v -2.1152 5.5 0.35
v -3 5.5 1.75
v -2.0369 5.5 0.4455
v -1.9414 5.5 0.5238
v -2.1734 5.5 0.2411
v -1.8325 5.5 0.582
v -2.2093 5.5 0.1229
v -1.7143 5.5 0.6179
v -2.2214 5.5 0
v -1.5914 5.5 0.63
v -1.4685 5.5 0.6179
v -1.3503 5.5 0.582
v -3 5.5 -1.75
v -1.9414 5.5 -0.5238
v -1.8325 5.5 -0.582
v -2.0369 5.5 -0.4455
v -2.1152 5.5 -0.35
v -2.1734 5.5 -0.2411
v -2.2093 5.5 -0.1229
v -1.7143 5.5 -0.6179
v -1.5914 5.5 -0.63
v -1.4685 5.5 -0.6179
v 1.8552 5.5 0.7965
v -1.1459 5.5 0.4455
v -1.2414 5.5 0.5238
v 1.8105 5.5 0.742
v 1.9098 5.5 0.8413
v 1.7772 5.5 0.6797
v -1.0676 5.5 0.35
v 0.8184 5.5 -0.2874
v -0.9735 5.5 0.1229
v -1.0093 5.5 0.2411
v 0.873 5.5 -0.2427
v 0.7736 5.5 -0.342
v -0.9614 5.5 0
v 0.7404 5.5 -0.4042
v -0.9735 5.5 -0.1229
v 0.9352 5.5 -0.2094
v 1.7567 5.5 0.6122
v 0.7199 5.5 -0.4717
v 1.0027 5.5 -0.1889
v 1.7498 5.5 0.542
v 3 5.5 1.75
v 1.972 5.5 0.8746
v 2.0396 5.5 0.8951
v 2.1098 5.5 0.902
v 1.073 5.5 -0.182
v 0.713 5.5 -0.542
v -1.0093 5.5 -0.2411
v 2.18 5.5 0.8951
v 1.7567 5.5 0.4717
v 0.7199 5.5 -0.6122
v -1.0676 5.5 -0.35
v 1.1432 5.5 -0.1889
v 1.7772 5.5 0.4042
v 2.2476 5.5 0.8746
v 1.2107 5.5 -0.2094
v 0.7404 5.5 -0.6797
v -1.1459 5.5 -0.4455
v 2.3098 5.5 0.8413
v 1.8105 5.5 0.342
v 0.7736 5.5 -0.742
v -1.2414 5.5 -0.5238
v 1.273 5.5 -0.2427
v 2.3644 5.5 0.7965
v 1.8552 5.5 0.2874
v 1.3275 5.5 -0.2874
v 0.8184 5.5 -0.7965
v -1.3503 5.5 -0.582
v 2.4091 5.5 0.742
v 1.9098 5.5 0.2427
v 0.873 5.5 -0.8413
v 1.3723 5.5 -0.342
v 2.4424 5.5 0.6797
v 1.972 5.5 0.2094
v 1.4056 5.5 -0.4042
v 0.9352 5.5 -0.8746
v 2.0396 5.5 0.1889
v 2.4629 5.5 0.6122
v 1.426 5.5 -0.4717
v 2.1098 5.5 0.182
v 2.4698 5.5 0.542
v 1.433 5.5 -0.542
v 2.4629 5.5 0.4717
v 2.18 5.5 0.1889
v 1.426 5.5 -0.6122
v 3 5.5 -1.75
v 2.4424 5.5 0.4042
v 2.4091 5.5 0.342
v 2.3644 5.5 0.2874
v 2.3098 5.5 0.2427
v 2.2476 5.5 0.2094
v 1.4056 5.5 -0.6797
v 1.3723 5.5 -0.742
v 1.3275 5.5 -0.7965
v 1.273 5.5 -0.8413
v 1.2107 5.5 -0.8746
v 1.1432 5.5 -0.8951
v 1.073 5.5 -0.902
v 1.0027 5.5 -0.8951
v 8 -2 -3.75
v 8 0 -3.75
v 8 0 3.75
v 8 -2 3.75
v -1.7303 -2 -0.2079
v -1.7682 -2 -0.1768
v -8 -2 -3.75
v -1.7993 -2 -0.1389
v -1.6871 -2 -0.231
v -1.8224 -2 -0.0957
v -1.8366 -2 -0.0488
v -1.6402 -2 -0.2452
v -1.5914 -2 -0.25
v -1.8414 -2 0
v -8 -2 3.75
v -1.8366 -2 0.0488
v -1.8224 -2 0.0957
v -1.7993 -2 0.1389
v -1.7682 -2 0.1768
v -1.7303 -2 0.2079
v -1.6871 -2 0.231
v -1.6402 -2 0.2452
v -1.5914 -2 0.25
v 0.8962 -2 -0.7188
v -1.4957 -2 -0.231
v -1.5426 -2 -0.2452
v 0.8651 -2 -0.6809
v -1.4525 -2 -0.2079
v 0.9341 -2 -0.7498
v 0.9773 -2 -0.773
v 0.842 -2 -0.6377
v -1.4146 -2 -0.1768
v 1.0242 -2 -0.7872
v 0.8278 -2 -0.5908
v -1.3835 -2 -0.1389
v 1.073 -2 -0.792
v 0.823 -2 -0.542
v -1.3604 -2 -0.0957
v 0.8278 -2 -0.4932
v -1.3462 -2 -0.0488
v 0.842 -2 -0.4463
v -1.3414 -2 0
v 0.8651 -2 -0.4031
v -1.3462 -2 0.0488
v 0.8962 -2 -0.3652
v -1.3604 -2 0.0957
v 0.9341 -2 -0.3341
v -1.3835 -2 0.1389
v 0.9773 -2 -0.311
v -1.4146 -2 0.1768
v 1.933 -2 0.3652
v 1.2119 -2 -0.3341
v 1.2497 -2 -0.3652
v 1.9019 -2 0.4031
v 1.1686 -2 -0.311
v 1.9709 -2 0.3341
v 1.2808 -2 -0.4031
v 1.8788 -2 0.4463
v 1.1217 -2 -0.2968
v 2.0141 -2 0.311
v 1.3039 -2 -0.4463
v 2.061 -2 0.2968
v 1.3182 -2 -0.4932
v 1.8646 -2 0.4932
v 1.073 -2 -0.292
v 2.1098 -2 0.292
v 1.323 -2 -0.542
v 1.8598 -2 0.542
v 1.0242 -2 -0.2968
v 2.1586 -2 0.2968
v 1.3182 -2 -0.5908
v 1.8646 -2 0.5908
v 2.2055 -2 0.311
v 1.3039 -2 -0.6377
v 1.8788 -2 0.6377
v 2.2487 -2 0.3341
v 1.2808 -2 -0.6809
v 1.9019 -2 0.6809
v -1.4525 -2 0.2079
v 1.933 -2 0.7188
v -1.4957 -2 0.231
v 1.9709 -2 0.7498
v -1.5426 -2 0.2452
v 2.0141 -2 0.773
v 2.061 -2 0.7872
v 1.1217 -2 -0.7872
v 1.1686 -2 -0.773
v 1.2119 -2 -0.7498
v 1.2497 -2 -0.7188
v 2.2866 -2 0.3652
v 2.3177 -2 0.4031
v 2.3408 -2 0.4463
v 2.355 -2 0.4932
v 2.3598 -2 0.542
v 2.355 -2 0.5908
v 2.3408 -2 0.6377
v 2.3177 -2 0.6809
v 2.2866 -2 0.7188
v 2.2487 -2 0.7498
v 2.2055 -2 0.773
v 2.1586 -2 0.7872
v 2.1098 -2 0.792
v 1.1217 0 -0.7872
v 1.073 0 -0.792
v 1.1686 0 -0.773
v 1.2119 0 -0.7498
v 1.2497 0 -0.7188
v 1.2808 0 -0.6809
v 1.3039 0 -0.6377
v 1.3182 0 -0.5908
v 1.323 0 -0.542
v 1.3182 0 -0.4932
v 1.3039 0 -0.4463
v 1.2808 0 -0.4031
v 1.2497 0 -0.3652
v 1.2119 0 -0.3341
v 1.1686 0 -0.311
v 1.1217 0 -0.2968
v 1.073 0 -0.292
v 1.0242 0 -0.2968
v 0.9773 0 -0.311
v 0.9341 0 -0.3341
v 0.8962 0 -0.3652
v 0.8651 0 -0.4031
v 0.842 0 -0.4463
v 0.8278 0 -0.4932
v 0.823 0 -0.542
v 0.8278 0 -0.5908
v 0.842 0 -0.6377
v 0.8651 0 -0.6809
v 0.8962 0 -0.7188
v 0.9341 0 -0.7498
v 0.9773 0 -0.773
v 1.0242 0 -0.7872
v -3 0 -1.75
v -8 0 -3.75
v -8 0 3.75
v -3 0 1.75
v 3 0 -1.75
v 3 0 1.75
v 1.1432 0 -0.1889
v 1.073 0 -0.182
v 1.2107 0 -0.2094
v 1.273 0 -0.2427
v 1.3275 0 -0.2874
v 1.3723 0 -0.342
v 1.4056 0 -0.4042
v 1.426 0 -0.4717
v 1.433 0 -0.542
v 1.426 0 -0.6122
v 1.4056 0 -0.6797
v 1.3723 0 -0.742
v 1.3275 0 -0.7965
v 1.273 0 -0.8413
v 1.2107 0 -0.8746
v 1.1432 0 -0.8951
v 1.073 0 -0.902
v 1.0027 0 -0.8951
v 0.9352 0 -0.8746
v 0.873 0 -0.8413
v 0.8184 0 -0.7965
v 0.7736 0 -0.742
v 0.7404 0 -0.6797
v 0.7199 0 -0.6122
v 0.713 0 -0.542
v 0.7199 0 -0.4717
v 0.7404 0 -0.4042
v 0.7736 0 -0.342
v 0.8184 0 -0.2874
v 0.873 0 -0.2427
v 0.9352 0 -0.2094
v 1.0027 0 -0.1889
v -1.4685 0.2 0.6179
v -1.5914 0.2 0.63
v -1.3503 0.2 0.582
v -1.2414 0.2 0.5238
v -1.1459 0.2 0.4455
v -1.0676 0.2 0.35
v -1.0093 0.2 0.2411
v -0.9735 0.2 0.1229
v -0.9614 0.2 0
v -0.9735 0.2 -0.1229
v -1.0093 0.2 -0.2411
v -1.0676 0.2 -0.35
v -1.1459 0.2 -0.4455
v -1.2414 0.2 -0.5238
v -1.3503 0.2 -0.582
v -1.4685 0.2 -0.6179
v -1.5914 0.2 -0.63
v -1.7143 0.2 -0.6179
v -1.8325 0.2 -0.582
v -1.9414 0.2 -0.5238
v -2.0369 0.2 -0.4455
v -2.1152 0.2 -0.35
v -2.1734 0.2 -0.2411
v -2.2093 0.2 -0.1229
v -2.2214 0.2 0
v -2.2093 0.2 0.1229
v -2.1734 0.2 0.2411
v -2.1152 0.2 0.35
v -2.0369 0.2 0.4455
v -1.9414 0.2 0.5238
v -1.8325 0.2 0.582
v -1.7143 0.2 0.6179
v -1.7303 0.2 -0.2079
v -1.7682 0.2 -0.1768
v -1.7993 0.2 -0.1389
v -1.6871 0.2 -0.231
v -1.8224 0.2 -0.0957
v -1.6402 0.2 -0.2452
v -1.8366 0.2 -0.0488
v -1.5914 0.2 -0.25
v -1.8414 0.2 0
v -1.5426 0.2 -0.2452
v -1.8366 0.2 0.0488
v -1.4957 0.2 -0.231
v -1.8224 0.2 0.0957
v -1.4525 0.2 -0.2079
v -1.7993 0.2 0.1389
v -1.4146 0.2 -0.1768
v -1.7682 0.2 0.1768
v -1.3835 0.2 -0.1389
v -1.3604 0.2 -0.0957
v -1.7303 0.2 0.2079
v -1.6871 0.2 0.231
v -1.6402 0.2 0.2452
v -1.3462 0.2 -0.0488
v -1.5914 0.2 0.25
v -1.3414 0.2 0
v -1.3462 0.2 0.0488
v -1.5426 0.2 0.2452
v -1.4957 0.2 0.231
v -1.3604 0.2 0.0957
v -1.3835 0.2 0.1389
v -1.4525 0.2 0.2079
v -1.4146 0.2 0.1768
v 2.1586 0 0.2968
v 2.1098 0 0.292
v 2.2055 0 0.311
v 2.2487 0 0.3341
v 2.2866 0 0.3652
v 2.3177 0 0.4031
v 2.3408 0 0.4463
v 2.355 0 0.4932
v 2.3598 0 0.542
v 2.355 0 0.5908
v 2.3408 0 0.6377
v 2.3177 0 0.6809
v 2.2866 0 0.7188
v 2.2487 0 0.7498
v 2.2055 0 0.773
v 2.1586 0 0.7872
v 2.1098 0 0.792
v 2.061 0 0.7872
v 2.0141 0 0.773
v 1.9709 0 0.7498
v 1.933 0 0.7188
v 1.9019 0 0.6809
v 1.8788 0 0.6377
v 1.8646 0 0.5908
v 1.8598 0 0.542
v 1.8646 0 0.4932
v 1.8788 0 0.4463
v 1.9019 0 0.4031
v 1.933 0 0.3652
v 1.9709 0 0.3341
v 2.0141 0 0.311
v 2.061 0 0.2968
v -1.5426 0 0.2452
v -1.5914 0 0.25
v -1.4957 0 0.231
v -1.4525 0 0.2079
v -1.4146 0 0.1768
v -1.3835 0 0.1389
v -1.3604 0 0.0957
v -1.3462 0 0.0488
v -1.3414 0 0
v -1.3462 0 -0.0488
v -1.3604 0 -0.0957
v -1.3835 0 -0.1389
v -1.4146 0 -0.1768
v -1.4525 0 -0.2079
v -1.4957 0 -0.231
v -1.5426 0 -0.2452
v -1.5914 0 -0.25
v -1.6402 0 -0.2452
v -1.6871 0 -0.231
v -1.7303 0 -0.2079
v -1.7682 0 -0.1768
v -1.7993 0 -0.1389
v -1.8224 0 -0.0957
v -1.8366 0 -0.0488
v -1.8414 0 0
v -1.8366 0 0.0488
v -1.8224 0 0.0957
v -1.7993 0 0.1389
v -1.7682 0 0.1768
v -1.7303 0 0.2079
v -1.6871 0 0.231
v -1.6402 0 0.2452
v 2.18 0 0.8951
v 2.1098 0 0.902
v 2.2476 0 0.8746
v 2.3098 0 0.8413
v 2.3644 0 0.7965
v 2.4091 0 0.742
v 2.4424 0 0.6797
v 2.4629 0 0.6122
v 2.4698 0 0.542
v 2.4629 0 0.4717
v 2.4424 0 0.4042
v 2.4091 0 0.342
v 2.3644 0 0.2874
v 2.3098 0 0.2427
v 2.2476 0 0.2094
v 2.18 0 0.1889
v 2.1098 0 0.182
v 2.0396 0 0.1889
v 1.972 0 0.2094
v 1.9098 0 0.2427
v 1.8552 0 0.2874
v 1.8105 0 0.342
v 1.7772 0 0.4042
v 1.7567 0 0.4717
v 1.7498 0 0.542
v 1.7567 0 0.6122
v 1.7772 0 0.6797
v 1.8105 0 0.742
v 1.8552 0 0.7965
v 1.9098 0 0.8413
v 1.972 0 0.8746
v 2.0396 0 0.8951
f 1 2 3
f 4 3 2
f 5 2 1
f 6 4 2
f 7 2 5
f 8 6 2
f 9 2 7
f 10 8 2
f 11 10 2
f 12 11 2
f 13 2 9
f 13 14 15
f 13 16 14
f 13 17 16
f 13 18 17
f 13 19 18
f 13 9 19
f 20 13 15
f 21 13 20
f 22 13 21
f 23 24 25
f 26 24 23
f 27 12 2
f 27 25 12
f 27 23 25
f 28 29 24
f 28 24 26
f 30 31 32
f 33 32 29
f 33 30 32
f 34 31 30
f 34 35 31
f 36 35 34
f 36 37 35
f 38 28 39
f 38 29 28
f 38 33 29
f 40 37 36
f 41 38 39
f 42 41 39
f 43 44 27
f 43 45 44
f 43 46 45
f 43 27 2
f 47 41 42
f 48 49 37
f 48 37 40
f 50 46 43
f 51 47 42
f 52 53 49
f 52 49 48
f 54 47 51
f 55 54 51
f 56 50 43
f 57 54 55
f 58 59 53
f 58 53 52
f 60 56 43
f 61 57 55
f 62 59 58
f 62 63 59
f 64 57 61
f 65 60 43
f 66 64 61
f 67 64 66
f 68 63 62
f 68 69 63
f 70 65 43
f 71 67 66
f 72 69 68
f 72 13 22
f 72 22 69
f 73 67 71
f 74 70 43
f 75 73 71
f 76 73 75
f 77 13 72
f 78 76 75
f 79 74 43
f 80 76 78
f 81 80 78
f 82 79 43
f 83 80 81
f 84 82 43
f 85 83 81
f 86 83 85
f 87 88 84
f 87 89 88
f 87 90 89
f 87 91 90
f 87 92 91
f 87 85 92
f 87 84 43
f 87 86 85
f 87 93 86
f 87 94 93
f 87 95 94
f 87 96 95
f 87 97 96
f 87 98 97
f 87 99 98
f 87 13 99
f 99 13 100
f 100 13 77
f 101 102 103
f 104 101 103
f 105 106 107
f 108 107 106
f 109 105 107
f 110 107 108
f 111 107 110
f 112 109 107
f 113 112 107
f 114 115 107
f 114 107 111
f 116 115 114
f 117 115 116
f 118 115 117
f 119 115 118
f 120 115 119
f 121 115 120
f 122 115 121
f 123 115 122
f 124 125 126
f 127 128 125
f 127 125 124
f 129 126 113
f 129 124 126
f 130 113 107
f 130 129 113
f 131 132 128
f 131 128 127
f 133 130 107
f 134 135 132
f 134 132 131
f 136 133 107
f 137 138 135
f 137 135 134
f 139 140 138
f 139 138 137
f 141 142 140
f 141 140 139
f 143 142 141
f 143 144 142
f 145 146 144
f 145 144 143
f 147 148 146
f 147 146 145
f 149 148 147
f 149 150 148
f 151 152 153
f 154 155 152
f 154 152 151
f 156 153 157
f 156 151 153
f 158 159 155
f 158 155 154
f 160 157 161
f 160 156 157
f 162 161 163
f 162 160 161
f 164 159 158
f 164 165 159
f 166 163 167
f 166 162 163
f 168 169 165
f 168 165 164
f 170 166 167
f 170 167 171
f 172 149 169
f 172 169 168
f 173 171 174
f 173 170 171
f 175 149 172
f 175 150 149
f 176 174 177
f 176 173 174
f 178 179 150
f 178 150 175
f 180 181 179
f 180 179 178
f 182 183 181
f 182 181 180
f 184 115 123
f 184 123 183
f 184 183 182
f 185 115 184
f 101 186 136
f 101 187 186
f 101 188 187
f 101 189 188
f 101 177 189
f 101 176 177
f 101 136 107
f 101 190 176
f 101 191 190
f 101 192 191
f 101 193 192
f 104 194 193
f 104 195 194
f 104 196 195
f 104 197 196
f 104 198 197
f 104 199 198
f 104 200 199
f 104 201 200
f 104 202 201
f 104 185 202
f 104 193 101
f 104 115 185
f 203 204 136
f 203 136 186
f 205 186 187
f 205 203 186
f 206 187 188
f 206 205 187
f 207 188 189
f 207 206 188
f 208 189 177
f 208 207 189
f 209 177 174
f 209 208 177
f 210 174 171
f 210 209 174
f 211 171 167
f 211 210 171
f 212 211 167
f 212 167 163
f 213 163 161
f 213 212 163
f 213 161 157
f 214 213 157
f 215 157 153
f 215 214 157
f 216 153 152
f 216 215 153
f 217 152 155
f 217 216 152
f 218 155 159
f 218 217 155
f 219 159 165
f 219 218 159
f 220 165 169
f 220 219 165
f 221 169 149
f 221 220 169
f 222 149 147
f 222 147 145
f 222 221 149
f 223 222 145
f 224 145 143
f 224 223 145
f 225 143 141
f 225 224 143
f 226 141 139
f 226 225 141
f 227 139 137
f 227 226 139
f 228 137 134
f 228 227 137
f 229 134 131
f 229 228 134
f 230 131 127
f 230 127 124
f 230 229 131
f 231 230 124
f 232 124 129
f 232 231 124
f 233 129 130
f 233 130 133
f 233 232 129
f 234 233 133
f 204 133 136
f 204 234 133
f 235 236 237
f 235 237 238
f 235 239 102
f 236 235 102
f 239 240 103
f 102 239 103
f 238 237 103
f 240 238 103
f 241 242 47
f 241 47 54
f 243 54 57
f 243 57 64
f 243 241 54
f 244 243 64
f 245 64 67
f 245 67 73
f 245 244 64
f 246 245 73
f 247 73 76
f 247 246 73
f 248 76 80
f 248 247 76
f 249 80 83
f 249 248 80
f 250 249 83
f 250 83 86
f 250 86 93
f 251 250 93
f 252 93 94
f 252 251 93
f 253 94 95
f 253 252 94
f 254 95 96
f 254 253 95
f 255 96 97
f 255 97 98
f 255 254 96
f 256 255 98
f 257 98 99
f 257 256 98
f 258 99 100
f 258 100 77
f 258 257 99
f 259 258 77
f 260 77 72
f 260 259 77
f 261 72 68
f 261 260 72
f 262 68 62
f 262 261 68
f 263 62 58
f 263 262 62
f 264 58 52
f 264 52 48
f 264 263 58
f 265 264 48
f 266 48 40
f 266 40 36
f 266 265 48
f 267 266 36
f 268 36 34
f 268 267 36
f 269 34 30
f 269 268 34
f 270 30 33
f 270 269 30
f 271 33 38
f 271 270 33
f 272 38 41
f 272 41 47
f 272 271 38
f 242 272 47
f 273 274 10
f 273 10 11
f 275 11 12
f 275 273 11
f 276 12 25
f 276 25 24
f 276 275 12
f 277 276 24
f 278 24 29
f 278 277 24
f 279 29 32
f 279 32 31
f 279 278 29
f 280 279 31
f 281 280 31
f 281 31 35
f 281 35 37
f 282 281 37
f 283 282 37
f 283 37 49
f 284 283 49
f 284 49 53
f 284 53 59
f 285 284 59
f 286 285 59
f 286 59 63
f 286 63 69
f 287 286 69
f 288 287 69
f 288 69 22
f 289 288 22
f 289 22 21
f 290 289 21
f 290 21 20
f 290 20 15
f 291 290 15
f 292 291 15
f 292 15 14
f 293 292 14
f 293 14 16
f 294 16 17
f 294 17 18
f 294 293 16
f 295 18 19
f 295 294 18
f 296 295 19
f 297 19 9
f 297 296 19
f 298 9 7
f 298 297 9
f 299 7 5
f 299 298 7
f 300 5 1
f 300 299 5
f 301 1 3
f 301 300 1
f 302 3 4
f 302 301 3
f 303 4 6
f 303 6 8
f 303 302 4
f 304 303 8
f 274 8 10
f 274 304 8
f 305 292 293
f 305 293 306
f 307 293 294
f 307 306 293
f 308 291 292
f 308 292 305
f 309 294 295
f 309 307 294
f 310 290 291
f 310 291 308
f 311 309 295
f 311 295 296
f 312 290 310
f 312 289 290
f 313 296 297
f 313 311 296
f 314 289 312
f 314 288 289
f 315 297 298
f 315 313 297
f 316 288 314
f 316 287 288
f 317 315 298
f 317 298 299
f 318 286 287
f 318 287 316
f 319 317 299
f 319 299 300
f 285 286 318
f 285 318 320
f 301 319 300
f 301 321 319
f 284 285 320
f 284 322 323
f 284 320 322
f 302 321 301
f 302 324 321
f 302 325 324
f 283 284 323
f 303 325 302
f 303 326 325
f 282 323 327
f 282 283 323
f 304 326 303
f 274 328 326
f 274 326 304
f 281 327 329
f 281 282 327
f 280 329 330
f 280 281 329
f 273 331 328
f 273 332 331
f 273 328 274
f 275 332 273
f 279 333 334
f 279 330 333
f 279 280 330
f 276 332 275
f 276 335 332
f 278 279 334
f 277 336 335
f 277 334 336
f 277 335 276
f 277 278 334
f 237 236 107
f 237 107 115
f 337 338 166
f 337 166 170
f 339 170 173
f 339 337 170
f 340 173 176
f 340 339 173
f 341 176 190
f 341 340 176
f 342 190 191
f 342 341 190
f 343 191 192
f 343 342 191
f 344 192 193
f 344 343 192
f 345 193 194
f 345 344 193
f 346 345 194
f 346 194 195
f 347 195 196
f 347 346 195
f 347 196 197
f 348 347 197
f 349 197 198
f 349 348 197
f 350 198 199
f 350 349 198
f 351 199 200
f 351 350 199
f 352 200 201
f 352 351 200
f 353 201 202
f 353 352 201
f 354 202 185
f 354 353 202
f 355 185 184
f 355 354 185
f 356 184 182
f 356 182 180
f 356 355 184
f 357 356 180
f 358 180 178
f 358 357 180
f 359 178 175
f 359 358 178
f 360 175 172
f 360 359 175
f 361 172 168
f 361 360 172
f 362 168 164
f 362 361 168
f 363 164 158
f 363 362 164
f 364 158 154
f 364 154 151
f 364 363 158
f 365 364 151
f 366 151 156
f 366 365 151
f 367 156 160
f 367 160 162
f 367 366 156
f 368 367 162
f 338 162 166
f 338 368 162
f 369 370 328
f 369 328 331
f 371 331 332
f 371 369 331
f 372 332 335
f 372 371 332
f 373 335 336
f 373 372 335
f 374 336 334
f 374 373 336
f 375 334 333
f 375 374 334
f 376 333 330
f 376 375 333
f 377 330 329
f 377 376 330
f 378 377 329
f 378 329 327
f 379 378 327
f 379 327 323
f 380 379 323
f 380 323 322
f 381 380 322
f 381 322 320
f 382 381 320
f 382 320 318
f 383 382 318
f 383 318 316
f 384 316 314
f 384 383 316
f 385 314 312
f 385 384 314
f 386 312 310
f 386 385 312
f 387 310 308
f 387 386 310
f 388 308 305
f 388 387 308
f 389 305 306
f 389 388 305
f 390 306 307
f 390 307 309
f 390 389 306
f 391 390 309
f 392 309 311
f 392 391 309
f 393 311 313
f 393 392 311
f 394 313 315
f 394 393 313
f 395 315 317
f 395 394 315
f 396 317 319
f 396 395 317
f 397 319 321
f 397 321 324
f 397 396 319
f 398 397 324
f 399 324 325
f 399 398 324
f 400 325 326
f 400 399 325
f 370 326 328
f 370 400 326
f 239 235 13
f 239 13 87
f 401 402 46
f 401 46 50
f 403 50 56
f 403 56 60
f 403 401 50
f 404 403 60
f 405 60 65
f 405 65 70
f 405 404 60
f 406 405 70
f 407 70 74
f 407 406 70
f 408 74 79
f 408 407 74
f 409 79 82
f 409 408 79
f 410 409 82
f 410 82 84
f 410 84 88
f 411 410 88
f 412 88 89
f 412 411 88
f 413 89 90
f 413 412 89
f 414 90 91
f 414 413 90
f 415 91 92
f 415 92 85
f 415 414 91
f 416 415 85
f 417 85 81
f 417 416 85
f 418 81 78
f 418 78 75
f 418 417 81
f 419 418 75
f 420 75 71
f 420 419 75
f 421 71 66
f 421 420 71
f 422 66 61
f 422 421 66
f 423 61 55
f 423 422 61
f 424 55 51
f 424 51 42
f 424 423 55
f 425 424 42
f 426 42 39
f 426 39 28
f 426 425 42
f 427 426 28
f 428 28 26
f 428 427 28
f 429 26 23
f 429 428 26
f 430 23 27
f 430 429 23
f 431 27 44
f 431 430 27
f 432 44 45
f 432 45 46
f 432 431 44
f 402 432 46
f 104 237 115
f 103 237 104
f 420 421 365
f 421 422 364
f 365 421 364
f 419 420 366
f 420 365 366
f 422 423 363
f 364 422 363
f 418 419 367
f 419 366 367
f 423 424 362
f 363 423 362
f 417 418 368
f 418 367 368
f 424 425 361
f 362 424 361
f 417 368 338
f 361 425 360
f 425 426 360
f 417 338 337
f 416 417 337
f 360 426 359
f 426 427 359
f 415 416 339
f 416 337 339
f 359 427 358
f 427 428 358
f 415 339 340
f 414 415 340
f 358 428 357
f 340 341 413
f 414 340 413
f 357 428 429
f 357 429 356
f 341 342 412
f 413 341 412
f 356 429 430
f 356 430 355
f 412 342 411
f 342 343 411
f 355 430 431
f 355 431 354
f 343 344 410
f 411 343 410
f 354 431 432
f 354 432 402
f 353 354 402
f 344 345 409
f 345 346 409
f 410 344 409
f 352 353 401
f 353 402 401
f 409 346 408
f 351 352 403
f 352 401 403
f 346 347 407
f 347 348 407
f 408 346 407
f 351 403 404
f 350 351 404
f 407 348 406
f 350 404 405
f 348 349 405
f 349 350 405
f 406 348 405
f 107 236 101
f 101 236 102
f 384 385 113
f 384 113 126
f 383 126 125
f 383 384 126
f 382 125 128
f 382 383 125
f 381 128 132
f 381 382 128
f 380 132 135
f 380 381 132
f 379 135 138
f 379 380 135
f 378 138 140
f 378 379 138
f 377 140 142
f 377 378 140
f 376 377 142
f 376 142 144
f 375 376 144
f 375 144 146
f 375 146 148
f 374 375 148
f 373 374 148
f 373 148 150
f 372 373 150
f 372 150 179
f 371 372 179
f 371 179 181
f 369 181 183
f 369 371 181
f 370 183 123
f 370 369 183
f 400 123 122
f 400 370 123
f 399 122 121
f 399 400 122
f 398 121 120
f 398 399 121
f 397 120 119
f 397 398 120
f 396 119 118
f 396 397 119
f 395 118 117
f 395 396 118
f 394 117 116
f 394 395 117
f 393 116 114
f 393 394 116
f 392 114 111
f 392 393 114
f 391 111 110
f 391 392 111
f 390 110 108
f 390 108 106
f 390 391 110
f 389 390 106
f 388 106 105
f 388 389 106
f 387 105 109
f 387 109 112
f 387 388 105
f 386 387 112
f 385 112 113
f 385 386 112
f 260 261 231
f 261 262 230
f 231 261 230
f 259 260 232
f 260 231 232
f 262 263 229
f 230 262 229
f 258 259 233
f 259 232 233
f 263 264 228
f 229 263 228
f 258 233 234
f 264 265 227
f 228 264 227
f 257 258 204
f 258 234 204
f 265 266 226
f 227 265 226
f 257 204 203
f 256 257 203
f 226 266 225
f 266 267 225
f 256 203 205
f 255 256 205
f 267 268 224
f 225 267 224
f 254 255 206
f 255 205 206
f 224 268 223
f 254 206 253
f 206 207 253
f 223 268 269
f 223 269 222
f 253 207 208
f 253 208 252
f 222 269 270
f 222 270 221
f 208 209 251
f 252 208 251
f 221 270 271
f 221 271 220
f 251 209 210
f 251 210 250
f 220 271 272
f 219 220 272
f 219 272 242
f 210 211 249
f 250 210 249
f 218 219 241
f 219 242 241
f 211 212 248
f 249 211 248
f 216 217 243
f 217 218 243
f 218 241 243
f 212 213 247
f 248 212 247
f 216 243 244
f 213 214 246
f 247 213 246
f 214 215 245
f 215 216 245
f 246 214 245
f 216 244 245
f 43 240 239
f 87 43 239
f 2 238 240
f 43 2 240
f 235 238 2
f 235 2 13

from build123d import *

# Parameters (mm, degrees)
SKETCH1_W                            = 6
SKETCH1_H                            = 3.5
SKETCH1_R                            = 0.36
SKETCH1_R_2                          = 0.63
CANULALAYOUT_BOSS_EXTRUDE1_DEPTH     = 5.5
SKETCH2_W                            = 16
SKETCH2_H                            = 7.5
SKETCH2_R                            = 0.25
BASE_BOSS_EXTRUDE2_DEPTH             = 2
SKETCH3_R                            = 0.63
SKETCH3_R_2                          = 0.25
HEIGHTDIFFERENCE_BOSS_EXTRUDE3_DEPTH = 0.2


with BuildPart() as part:
    # Sketch1 → CanulaLayout-Boss-Extrude1 (new body)
    with BuildSketch(Plane(origin=(0, 0, 0), x_dir=(1, 0, 0), z_dir=(0, 1, 0))):
        Rectangle(SKETCH1_W, SKETCH1_H)
        with Locations(Location((1.072966062, 0.541981393, 0), (0, 0, 270))):
            Circle(SKETCH1_R, mode=Mode.SUBTRACT)
        with Locations(Location((2.109800031, -0.541981393, 0), (0, 0, 270))):
            Circle(SKETCH1_R, mode=Mode.SUBTRACT)
        with Locations(Location((-1.591383046, 0, 0), (0, 0, 270))):
            Circle(SKETCH1_R_2, mode=Mode.SUBTRACT)
    extrude(amount=CANULALAYOUT_BOSS_EXTRUDE1_DEPTH)

    # Sketch2 → Base-Boss-Extrude2 (add)
    with BuildSketch(Plane.XZ):
        Rectangle(SKETCH2_W, SKETCH2_H)
        with Locations(Location((2.109800031, 0.541981393, 0), (0, 0, 270))):
            Circle(SKETCH2_R, mode=Mode.SUBTRACT)
        with Locations(Location((1.072966062, -0.541981393, 0), (0, 0, 270))):
            Circle(SKETCH2_R, mode=Mode.SUBTRACT)
        with Locations(Location((-1.591383046, 0, 0), (0, 0, 270))):
            Circle(SKETCH2_R, mode=Mode.SUBTRACT)
    extrude(amount=BASE_BOSS_EXTRUDE2_DEPTH)

    # Sketch3 → HeightDifference-Boss-Extrude3 (add)
    with BuildSketch(Plane(origin=(0, 0, 0), x_dir=(1, 0, 0), z_dir=(0, 1, 0))):
        with Locations(Location((-1.591383046, 0, 0), (0, 0, 270))):
            Circle(SKETCH3_R)
        with Locations(Location((-1.591383046, 0, 0), (0, 0, 270))):
            Circle(SKETCH3_R_2, mode=Mode.SUBTRACT)
    extrude(amount=HEIGHTDIFFERENCE_BOSS_EXTRUDE3_DEPTH)


solid = part.part
